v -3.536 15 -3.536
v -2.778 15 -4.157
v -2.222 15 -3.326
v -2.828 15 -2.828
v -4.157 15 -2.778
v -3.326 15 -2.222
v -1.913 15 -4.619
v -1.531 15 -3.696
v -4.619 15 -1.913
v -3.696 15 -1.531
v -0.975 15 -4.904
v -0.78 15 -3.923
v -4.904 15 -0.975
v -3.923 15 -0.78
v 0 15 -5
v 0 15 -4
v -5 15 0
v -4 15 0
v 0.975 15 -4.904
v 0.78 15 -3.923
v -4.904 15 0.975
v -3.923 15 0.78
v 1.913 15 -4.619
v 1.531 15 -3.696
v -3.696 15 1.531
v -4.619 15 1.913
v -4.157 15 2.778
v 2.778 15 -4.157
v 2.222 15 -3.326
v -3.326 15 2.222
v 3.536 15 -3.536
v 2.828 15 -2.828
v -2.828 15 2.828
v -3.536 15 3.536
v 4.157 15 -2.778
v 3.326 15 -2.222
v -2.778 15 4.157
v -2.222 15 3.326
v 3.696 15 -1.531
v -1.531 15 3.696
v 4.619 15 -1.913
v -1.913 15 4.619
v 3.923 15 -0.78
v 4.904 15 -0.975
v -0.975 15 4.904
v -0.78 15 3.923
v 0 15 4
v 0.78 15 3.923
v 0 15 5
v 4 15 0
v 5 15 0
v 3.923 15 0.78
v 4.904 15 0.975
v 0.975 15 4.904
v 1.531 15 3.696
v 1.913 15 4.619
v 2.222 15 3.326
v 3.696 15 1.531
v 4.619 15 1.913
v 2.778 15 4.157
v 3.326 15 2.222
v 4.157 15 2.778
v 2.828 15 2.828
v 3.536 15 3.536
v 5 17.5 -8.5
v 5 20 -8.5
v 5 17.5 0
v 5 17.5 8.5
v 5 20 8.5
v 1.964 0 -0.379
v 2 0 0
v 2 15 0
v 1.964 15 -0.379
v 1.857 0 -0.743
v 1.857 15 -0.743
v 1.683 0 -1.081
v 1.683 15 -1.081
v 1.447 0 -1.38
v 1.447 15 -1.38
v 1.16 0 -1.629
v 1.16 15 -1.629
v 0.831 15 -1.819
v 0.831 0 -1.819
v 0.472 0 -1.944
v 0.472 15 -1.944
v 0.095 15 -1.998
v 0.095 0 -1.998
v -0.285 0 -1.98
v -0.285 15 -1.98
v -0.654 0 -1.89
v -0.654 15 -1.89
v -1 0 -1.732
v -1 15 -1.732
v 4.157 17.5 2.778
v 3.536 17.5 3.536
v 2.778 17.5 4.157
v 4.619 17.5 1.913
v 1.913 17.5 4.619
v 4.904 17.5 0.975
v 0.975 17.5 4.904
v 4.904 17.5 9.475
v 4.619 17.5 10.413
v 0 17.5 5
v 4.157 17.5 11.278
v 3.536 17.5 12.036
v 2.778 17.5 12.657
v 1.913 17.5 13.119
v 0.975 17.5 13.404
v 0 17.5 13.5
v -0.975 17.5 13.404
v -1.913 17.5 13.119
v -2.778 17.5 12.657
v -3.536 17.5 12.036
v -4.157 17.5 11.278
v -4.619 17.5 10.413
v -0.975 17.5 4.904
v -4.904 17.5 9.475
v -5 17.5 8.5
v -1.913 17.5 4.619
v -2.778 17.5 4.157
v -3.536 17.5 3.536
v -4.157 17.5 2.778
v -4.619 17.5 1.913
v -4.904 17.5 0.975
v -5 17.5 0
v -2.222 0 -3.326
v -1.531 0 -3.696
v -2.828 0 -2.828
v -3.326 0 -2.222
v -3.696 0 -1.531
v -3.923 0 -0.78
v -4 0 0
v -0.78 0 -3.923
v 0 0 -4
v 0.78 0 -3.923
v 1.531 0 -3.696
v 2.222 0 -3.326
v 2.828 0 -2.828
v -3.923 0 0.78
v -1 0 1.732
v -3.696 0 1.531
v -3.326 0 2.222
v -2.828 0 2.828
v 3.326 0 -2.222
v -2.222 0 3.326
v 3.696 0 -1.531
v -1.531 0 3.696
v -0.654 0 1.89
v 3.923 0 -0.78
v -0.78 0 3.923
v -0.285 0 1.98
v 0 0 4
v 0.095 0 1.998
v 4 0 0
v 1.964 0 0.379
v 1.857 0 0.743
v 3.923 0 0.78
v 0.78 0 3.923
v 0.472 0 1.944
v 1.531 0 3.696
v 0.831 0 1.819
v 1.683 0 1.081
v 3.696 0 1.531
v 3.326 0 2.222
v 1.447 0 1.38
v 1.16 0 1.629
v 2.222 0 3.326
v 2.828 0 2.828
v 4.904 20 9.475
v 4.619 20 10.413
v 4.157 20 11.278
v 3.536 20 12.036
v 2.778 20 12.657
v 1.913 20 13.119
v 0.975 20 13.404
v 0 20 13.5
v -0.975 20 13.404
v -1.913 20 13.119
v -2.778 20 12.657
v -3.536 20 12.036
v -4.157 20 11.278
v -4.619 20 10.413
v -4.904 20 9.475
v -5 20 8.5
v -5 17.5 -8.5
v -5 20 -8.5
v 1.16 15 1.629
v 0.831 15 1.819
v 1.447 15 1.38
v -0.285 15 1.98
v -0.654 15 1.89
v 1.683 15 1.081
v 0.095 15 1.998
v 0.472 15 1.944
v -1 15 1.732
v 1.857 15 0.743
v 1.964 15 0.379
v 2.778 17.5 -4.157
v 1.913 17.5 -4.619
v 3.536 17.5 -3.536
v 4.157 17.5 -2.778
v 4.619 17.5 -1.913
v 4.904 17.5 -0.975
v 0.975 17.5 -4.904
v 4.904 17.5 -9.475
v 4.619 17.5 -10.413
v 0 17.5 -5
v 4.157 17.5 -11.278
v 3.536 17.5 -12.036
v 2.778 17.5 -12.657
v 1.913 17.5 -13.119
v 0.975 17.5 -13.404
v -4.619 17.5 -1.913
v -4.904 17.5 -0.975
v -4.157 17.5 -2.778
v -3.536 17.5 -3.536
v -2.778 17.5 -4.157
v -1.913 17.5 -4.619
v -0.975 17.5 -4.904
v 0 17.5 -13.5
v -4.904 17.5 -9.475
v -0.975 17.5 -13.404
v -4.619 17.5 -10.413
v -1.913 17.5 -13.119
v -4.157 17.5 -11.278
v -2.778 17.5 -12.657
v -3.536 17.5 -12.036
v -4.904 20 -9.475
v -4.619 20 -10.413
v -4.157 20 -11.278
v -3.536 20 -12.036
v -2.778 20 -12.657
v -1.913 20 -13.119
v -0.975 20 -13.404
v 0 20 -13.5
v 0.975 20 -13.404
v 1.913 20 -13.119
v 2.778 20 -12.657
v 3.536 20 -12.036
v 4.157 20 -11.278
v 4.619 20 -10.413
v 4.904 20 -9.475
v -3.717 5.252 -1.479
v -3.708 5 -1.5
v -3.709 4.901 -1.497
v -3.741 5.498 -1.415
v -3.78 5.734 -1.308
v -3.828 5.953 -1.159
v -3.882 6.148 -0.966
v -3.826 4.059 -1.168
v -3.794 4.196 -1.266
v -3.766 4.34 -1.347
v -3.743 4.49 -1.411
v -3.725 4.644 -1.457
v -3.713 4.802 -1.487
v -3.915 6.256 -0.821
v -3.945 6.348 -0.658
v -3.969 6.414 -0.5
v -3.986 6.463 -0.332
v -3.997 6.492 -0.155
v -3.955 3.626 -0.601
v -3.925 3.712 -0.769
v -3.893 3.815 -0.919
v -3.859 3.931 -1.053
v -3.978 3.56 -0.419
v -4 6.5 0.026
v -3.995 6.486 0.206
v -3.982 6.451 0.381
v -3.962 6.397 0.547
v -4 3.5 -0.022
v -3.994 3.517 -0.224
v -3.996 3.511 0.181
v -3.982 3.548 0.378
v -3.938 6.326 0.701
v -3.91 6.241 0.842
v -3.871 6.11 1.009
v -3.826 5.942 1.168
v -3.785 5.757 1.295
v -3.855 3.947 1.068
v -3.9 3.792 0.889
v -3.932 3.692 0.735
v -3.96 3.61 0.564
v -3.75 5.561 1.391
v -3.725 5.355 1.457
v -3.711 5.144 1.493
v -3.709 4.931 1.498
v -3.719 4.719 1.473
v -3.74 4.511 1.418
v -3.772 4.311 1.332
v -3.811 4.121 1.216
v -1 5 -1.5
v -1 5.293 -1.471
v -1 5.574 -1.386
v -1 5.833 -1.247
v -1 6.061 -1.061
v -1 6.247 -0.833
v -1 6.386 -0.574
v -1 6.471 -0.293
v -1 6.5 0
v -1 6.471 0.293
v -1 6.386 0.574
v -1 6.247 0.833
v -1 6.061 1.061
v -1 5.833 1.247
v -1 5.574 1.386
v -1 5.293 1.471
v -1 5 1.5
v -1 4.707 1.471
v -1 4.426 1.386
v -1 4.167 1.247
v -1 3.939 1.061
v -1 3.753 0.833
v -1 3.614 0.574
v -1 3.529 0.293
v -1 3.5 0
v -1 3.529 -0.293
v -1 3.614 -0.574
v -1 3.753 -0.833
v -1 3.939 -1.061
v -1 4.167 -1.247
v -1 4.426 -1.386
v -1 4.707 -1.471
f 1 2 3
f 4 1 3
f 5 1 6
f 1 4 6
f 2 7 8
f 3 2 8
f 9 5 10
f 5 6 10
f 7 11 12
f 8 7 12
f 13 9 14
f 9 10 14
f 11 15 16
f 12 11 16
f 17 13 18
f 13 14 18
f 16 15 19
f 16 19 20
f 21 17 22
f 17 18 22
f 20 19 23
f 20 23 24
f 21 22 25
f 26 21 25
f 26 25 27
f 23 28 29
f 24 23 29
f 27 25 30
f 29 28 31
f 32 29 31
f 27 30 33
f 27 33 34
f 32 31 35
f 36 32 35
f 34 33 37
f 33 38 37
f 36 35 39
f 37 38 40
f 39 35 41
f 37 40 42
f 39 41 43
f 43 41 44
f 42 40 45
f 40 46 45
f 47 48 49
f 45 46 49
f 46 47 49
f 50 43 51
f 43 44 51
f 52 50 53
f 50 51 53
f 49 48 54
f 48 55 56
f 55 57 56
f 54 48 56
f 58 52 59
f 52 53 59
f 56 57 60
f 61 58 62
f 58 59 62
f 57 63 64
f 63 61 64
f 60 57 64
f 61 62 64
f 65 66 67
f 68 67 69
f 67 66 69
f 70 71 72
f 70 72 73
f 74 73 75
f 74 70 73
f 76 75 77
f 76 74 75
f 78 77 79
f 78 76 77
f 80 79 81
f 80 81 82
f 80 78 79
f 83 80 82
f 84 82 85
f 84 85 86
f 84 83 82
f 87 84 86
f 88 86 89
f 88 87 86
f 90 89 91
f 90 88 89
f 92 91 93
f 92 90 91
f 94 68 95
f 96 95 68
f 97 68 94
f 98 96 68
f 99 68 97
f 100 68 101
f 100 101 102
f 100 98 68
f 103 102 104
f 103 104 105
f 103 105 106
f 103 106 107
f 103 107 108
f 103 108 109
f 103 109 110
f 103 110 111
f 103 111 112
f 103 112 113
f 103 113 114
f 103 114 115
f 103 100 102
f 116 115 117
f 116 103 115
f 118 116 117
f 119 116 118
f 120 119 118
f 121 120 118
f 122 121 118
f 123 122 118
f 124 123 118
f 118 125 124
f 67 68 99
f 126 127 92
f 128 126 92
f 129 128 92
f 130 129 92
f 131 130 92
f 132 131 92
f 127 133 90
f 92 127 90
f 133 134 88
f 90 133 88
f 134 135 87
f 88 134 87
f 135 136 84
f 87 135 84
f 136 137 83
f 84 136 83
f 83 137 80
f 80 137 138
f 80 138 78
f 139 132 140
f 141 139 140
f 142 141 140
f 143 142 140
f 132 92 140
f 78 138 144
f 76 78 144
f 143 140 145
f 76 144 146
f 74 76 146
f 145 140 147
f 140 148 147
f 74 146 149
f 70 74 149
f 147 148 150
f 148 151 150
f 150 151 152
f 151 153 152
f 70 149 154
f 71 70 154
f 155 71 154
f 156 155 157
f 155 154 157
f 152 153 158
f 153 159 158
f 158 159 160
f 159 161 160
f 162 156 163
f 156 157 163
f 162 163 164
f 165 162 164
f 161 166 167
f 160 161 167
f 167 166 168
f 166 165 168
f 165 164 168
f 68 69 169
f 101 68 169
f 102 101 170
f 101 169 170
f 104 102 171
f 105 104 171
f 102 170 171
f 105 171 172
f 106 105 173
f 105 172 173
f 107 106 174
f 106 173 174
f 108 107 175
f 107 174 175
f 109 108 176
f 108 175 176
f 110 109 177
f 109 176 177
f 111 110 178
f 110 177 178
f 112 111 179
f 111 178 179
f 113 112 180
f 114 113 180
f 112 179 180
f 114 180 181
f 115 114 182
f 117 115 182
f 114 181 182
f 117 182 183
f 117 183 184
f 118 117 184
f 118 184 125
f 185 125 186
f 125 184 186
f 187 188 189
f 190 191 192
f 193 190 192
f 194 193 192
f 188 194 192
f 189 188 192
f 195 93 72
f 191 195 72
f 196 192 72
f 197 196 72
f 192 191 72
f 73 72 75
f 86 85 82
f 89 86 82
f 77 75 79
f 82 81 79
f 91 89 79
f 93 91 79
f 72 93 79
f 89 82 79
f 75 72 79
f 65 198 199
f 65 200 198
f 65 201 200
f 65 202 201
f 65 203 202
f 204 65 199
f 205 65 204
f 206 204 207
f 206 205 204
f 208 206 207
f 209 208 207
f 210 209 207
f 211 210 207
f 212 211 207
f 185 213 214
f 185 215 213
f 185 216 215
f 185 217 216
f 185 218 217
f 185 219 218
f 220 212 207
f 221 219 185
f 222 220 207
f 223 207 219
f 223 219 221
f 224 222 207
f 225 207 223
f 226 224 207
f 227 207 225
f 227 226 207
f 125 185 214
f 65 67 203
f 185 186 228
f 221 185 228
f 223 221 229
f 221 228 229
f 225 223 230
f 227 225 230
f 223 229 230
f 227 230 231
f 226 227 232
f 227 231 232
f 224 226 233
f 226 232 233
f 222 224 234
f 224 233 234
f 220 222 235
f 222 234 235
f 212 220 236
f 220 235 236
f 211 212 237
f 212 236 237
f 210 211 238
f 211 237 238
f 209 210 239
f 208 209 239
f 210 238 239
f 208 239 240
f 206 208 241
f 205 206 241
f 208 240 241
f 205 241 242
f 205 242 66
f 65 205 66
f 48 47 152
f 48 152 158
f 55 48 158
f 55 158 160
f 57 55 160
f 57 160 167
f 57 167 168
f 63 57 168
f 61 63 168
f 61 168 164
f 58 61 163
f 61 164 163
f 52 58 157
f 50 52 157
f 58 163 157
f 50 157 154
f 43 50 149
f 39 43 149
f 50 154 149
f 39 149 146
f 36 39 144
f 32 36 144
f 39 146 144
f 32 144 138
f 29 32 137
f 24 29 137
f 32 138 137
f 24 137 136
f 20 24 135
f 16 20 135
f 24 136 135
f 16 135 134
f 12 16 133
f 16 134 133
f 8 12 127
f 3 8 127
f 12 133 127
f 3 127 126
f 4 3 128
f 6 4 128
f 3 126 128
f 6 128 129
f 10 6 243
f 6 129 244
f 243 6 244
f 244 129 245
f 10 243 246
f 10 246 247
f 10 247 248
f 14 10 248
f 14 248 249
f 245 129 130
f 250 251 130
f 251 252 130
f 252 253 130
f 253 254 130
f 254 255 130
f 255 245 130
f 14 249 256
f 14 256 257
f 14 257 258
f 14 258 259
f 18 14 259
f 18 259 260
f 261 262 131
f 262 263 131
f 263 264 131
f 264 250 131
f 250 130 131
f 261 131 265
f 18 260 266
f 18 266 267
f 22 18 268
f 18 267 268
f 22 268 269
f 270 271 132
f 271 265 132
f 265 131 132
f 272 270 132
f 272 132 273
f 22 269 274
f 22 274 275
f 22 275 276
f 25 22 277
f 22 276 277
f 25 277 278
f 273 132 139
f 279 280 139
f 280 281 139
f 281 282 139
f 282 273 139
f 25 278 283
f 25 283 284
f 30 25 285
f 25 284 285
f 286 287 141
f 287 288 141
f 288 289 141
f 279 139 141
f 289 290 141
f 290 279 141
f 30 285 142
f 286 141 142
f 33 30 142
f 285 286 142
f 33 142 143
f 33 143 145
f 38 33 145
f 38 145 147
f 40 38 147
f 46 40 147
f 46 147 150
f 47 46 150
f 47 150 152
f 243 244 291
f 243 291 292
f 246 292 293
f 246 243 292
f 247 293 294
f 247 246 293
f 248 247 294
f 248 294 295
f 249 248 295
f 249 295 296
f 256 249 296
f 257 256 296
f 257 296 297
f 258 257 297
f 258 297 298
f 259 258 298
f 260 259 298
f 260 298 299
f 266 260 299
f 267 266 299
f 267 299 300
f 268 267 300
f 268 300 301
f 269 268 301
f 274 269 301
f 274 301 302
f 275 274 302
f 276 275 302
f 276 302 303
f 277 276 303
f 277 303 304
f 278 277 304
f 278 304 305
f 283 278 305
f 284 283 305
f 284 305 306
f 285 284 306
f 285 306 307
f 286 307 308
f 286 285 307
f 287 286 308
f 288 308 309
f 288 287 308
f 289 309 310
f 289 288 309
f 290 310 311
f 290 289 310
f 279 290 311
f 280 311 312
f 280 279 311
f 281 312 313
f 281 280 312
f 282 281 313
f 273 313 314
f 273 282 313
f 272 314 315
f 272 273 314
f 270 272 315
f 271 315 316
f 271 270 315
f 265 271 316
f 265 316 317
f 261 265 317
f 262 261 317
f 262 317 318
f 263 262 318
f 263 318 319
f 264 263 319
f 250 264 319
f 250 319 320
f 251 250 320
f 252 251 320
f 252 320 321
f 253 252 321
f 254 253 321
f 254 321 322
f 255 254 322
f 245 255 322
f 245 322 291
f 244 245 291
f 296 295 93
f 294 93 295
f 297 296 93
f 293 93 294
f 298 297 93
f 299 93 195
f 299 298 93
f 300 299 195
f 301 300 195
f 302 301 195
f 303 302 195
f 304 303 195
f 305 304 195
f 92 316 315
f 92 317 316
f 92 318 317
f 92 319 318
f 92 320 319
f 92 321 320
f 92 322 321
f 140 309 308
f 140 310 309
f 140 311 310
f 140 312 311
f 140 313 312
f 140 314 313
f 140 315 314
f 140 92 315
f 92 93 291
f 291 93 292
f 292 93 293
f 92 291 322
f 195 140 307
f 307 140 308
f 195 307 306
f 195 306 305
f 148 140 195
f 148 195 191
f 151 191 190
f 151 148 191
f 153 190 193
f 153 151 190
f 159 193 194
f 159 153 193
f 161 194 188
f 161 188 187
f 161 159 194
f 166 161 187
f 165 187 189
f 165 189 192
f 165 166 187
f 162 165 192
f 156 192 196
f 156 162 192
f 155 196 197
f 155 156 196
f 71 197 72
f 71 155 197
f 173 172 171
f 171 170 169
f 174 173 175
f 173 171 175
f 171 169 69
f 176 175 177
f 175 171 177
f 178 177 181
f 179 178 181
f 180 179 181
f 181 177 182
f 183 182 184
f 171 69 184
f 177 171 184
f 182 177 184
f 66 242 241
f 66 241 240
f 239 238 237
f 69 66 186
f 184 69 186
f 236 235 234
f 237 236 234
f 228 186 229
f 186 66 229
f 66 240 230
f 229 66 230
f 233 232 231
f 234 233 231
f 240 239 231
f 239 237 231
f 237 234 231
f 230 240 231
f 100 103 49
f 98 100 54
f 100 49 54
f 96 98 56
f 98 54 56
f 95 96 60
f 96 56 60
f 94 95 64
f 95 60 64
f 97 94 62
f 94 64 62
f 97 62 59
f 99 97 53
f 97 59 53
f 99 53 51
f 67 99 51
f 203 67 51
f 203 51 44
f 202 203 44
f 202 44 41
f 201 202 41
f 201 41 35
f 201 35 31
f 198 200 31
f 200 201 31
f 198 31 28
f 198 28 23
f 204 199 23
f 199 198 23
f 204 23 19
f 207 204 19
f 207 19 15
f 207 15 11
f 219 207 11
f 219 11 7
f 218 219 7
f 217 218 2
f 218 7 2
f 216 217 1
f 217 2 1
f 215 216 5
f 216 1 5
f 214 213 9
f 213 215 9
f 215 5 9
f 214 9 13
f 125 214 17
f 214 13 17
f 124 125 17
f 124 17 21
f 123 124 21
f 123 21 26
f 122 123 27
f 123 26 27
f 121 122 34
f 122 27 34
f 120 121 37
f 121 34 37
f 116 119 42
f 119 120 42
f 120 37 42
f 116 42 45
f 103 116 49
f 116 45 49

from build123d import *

# Parameters (mm, degrees)
SKETCH3_R                 = 4
BOSS_EXTRUDE1_DEPTH       = 15
BOSS_EXTRUDE2_START       = 15
SKETCH3_3_R               = 5
BOSS_EXTRUDE2_DEPTH       = 5
BOSS_EXTRUDE3_START       = 20
BOSS_EXTRUDE3_DEPTH       = 2.5
CUT_EXTRUDE1_DEPTH        = 15
GRUB_START                = -4.0000001
GRUB_SCREW_HOLE_OUTLINE_R = 1.5
GRUB_SCREW_HOLE_DEPTH     = 3.0000001


# Read off the part's stored shape, not the designer's step: Grub Screw Hole
with BuildPart() as part:
    # Sketch3 → Boss-Extrude1 (new body)
    with BuildSketch(Plane(origin=(0, 0, 0), x_dir=(1, 0, 0), z_dir=(0, 1, 0))):
        with Locations(Location((0, 0, 0), (0, 0, 270))):
            Circle(SKETCH3_R)
    extrude(amount=BOSS_EXTRUDE1_DEPTH)

    # Sketch3<3> → Boss-Extrude2 (add)
    with BuildSketch(Plane(origin=(0, 0, 0), x_dir=(1, 0, 0), z_dir=(0, 1, 0)).offset(BOSS_EXTRUDE2_START)):
        with Locations(Location((0, 0, 0), (0, 0, 270))):
            Circle(SKETCH3_3_R)
    extrude(amount=BOSS_EXTRUDE2_DEPTH)

    # Sketch3<5> → Boss-Extrude3 (add)
    with BuildSketch(Plane(origin=(0, 0, 0), x_dir=(1, 0, 0), z_dir=(0, 1, 0)).offset(BOSS_EXTRUDE3_START)):
        with BuildLine():
            Line((-5, -8.5), (-5, 8.5))
            ThreePointArc((-5, 8.5), (0, 13.5), (5, 8.5))
            Line((5, 8.5), (5, -8.5))
            ThreePointArc((5, -8.5), (0, -13.5), (-5, -8.5))
        make_face()
    extrude(amount=-BOSS_EXTRUDE3_DEPTH)

    # Sketch5 → Cut-Extrude1 (cut)
    with BuildSketch(Plane(origin=(0, 0, 0), x_dir=(1, 0, 0), z_dir=(0, 1, 0))):
        with BuildLine():
            ThreePointArc((2, 0), (1, 1.732050808), (-1, 1.732050808))
            Line((-1, 1.732050808), (-1, -1.732050808))
            ThreePointArc((-1, -1.732050808), (1, -1.732050808), (2, 0))
        make_face()
    extrude(amount=CUT_EXTRUDE1_DEPTH, mode=Mode.SUBTRACT)

    # Grub Screw Hole outline → Grub Screw Hole (cut)
    with BuildSketch(Plane(origin=(0, 0, 0), x_dir=(0, 0, -1), z_dir=(1, 0, 0)).offset(GRUB_START)):
        with Locations((0, 5)):
            Circle(GRUB_SCREW_HOLE_OUTLINE_R)
    extrude(amount=GRUB_SCREW_HOLE_DEPTH, mode=Mode.SUBTRACT)


solid = part.part
